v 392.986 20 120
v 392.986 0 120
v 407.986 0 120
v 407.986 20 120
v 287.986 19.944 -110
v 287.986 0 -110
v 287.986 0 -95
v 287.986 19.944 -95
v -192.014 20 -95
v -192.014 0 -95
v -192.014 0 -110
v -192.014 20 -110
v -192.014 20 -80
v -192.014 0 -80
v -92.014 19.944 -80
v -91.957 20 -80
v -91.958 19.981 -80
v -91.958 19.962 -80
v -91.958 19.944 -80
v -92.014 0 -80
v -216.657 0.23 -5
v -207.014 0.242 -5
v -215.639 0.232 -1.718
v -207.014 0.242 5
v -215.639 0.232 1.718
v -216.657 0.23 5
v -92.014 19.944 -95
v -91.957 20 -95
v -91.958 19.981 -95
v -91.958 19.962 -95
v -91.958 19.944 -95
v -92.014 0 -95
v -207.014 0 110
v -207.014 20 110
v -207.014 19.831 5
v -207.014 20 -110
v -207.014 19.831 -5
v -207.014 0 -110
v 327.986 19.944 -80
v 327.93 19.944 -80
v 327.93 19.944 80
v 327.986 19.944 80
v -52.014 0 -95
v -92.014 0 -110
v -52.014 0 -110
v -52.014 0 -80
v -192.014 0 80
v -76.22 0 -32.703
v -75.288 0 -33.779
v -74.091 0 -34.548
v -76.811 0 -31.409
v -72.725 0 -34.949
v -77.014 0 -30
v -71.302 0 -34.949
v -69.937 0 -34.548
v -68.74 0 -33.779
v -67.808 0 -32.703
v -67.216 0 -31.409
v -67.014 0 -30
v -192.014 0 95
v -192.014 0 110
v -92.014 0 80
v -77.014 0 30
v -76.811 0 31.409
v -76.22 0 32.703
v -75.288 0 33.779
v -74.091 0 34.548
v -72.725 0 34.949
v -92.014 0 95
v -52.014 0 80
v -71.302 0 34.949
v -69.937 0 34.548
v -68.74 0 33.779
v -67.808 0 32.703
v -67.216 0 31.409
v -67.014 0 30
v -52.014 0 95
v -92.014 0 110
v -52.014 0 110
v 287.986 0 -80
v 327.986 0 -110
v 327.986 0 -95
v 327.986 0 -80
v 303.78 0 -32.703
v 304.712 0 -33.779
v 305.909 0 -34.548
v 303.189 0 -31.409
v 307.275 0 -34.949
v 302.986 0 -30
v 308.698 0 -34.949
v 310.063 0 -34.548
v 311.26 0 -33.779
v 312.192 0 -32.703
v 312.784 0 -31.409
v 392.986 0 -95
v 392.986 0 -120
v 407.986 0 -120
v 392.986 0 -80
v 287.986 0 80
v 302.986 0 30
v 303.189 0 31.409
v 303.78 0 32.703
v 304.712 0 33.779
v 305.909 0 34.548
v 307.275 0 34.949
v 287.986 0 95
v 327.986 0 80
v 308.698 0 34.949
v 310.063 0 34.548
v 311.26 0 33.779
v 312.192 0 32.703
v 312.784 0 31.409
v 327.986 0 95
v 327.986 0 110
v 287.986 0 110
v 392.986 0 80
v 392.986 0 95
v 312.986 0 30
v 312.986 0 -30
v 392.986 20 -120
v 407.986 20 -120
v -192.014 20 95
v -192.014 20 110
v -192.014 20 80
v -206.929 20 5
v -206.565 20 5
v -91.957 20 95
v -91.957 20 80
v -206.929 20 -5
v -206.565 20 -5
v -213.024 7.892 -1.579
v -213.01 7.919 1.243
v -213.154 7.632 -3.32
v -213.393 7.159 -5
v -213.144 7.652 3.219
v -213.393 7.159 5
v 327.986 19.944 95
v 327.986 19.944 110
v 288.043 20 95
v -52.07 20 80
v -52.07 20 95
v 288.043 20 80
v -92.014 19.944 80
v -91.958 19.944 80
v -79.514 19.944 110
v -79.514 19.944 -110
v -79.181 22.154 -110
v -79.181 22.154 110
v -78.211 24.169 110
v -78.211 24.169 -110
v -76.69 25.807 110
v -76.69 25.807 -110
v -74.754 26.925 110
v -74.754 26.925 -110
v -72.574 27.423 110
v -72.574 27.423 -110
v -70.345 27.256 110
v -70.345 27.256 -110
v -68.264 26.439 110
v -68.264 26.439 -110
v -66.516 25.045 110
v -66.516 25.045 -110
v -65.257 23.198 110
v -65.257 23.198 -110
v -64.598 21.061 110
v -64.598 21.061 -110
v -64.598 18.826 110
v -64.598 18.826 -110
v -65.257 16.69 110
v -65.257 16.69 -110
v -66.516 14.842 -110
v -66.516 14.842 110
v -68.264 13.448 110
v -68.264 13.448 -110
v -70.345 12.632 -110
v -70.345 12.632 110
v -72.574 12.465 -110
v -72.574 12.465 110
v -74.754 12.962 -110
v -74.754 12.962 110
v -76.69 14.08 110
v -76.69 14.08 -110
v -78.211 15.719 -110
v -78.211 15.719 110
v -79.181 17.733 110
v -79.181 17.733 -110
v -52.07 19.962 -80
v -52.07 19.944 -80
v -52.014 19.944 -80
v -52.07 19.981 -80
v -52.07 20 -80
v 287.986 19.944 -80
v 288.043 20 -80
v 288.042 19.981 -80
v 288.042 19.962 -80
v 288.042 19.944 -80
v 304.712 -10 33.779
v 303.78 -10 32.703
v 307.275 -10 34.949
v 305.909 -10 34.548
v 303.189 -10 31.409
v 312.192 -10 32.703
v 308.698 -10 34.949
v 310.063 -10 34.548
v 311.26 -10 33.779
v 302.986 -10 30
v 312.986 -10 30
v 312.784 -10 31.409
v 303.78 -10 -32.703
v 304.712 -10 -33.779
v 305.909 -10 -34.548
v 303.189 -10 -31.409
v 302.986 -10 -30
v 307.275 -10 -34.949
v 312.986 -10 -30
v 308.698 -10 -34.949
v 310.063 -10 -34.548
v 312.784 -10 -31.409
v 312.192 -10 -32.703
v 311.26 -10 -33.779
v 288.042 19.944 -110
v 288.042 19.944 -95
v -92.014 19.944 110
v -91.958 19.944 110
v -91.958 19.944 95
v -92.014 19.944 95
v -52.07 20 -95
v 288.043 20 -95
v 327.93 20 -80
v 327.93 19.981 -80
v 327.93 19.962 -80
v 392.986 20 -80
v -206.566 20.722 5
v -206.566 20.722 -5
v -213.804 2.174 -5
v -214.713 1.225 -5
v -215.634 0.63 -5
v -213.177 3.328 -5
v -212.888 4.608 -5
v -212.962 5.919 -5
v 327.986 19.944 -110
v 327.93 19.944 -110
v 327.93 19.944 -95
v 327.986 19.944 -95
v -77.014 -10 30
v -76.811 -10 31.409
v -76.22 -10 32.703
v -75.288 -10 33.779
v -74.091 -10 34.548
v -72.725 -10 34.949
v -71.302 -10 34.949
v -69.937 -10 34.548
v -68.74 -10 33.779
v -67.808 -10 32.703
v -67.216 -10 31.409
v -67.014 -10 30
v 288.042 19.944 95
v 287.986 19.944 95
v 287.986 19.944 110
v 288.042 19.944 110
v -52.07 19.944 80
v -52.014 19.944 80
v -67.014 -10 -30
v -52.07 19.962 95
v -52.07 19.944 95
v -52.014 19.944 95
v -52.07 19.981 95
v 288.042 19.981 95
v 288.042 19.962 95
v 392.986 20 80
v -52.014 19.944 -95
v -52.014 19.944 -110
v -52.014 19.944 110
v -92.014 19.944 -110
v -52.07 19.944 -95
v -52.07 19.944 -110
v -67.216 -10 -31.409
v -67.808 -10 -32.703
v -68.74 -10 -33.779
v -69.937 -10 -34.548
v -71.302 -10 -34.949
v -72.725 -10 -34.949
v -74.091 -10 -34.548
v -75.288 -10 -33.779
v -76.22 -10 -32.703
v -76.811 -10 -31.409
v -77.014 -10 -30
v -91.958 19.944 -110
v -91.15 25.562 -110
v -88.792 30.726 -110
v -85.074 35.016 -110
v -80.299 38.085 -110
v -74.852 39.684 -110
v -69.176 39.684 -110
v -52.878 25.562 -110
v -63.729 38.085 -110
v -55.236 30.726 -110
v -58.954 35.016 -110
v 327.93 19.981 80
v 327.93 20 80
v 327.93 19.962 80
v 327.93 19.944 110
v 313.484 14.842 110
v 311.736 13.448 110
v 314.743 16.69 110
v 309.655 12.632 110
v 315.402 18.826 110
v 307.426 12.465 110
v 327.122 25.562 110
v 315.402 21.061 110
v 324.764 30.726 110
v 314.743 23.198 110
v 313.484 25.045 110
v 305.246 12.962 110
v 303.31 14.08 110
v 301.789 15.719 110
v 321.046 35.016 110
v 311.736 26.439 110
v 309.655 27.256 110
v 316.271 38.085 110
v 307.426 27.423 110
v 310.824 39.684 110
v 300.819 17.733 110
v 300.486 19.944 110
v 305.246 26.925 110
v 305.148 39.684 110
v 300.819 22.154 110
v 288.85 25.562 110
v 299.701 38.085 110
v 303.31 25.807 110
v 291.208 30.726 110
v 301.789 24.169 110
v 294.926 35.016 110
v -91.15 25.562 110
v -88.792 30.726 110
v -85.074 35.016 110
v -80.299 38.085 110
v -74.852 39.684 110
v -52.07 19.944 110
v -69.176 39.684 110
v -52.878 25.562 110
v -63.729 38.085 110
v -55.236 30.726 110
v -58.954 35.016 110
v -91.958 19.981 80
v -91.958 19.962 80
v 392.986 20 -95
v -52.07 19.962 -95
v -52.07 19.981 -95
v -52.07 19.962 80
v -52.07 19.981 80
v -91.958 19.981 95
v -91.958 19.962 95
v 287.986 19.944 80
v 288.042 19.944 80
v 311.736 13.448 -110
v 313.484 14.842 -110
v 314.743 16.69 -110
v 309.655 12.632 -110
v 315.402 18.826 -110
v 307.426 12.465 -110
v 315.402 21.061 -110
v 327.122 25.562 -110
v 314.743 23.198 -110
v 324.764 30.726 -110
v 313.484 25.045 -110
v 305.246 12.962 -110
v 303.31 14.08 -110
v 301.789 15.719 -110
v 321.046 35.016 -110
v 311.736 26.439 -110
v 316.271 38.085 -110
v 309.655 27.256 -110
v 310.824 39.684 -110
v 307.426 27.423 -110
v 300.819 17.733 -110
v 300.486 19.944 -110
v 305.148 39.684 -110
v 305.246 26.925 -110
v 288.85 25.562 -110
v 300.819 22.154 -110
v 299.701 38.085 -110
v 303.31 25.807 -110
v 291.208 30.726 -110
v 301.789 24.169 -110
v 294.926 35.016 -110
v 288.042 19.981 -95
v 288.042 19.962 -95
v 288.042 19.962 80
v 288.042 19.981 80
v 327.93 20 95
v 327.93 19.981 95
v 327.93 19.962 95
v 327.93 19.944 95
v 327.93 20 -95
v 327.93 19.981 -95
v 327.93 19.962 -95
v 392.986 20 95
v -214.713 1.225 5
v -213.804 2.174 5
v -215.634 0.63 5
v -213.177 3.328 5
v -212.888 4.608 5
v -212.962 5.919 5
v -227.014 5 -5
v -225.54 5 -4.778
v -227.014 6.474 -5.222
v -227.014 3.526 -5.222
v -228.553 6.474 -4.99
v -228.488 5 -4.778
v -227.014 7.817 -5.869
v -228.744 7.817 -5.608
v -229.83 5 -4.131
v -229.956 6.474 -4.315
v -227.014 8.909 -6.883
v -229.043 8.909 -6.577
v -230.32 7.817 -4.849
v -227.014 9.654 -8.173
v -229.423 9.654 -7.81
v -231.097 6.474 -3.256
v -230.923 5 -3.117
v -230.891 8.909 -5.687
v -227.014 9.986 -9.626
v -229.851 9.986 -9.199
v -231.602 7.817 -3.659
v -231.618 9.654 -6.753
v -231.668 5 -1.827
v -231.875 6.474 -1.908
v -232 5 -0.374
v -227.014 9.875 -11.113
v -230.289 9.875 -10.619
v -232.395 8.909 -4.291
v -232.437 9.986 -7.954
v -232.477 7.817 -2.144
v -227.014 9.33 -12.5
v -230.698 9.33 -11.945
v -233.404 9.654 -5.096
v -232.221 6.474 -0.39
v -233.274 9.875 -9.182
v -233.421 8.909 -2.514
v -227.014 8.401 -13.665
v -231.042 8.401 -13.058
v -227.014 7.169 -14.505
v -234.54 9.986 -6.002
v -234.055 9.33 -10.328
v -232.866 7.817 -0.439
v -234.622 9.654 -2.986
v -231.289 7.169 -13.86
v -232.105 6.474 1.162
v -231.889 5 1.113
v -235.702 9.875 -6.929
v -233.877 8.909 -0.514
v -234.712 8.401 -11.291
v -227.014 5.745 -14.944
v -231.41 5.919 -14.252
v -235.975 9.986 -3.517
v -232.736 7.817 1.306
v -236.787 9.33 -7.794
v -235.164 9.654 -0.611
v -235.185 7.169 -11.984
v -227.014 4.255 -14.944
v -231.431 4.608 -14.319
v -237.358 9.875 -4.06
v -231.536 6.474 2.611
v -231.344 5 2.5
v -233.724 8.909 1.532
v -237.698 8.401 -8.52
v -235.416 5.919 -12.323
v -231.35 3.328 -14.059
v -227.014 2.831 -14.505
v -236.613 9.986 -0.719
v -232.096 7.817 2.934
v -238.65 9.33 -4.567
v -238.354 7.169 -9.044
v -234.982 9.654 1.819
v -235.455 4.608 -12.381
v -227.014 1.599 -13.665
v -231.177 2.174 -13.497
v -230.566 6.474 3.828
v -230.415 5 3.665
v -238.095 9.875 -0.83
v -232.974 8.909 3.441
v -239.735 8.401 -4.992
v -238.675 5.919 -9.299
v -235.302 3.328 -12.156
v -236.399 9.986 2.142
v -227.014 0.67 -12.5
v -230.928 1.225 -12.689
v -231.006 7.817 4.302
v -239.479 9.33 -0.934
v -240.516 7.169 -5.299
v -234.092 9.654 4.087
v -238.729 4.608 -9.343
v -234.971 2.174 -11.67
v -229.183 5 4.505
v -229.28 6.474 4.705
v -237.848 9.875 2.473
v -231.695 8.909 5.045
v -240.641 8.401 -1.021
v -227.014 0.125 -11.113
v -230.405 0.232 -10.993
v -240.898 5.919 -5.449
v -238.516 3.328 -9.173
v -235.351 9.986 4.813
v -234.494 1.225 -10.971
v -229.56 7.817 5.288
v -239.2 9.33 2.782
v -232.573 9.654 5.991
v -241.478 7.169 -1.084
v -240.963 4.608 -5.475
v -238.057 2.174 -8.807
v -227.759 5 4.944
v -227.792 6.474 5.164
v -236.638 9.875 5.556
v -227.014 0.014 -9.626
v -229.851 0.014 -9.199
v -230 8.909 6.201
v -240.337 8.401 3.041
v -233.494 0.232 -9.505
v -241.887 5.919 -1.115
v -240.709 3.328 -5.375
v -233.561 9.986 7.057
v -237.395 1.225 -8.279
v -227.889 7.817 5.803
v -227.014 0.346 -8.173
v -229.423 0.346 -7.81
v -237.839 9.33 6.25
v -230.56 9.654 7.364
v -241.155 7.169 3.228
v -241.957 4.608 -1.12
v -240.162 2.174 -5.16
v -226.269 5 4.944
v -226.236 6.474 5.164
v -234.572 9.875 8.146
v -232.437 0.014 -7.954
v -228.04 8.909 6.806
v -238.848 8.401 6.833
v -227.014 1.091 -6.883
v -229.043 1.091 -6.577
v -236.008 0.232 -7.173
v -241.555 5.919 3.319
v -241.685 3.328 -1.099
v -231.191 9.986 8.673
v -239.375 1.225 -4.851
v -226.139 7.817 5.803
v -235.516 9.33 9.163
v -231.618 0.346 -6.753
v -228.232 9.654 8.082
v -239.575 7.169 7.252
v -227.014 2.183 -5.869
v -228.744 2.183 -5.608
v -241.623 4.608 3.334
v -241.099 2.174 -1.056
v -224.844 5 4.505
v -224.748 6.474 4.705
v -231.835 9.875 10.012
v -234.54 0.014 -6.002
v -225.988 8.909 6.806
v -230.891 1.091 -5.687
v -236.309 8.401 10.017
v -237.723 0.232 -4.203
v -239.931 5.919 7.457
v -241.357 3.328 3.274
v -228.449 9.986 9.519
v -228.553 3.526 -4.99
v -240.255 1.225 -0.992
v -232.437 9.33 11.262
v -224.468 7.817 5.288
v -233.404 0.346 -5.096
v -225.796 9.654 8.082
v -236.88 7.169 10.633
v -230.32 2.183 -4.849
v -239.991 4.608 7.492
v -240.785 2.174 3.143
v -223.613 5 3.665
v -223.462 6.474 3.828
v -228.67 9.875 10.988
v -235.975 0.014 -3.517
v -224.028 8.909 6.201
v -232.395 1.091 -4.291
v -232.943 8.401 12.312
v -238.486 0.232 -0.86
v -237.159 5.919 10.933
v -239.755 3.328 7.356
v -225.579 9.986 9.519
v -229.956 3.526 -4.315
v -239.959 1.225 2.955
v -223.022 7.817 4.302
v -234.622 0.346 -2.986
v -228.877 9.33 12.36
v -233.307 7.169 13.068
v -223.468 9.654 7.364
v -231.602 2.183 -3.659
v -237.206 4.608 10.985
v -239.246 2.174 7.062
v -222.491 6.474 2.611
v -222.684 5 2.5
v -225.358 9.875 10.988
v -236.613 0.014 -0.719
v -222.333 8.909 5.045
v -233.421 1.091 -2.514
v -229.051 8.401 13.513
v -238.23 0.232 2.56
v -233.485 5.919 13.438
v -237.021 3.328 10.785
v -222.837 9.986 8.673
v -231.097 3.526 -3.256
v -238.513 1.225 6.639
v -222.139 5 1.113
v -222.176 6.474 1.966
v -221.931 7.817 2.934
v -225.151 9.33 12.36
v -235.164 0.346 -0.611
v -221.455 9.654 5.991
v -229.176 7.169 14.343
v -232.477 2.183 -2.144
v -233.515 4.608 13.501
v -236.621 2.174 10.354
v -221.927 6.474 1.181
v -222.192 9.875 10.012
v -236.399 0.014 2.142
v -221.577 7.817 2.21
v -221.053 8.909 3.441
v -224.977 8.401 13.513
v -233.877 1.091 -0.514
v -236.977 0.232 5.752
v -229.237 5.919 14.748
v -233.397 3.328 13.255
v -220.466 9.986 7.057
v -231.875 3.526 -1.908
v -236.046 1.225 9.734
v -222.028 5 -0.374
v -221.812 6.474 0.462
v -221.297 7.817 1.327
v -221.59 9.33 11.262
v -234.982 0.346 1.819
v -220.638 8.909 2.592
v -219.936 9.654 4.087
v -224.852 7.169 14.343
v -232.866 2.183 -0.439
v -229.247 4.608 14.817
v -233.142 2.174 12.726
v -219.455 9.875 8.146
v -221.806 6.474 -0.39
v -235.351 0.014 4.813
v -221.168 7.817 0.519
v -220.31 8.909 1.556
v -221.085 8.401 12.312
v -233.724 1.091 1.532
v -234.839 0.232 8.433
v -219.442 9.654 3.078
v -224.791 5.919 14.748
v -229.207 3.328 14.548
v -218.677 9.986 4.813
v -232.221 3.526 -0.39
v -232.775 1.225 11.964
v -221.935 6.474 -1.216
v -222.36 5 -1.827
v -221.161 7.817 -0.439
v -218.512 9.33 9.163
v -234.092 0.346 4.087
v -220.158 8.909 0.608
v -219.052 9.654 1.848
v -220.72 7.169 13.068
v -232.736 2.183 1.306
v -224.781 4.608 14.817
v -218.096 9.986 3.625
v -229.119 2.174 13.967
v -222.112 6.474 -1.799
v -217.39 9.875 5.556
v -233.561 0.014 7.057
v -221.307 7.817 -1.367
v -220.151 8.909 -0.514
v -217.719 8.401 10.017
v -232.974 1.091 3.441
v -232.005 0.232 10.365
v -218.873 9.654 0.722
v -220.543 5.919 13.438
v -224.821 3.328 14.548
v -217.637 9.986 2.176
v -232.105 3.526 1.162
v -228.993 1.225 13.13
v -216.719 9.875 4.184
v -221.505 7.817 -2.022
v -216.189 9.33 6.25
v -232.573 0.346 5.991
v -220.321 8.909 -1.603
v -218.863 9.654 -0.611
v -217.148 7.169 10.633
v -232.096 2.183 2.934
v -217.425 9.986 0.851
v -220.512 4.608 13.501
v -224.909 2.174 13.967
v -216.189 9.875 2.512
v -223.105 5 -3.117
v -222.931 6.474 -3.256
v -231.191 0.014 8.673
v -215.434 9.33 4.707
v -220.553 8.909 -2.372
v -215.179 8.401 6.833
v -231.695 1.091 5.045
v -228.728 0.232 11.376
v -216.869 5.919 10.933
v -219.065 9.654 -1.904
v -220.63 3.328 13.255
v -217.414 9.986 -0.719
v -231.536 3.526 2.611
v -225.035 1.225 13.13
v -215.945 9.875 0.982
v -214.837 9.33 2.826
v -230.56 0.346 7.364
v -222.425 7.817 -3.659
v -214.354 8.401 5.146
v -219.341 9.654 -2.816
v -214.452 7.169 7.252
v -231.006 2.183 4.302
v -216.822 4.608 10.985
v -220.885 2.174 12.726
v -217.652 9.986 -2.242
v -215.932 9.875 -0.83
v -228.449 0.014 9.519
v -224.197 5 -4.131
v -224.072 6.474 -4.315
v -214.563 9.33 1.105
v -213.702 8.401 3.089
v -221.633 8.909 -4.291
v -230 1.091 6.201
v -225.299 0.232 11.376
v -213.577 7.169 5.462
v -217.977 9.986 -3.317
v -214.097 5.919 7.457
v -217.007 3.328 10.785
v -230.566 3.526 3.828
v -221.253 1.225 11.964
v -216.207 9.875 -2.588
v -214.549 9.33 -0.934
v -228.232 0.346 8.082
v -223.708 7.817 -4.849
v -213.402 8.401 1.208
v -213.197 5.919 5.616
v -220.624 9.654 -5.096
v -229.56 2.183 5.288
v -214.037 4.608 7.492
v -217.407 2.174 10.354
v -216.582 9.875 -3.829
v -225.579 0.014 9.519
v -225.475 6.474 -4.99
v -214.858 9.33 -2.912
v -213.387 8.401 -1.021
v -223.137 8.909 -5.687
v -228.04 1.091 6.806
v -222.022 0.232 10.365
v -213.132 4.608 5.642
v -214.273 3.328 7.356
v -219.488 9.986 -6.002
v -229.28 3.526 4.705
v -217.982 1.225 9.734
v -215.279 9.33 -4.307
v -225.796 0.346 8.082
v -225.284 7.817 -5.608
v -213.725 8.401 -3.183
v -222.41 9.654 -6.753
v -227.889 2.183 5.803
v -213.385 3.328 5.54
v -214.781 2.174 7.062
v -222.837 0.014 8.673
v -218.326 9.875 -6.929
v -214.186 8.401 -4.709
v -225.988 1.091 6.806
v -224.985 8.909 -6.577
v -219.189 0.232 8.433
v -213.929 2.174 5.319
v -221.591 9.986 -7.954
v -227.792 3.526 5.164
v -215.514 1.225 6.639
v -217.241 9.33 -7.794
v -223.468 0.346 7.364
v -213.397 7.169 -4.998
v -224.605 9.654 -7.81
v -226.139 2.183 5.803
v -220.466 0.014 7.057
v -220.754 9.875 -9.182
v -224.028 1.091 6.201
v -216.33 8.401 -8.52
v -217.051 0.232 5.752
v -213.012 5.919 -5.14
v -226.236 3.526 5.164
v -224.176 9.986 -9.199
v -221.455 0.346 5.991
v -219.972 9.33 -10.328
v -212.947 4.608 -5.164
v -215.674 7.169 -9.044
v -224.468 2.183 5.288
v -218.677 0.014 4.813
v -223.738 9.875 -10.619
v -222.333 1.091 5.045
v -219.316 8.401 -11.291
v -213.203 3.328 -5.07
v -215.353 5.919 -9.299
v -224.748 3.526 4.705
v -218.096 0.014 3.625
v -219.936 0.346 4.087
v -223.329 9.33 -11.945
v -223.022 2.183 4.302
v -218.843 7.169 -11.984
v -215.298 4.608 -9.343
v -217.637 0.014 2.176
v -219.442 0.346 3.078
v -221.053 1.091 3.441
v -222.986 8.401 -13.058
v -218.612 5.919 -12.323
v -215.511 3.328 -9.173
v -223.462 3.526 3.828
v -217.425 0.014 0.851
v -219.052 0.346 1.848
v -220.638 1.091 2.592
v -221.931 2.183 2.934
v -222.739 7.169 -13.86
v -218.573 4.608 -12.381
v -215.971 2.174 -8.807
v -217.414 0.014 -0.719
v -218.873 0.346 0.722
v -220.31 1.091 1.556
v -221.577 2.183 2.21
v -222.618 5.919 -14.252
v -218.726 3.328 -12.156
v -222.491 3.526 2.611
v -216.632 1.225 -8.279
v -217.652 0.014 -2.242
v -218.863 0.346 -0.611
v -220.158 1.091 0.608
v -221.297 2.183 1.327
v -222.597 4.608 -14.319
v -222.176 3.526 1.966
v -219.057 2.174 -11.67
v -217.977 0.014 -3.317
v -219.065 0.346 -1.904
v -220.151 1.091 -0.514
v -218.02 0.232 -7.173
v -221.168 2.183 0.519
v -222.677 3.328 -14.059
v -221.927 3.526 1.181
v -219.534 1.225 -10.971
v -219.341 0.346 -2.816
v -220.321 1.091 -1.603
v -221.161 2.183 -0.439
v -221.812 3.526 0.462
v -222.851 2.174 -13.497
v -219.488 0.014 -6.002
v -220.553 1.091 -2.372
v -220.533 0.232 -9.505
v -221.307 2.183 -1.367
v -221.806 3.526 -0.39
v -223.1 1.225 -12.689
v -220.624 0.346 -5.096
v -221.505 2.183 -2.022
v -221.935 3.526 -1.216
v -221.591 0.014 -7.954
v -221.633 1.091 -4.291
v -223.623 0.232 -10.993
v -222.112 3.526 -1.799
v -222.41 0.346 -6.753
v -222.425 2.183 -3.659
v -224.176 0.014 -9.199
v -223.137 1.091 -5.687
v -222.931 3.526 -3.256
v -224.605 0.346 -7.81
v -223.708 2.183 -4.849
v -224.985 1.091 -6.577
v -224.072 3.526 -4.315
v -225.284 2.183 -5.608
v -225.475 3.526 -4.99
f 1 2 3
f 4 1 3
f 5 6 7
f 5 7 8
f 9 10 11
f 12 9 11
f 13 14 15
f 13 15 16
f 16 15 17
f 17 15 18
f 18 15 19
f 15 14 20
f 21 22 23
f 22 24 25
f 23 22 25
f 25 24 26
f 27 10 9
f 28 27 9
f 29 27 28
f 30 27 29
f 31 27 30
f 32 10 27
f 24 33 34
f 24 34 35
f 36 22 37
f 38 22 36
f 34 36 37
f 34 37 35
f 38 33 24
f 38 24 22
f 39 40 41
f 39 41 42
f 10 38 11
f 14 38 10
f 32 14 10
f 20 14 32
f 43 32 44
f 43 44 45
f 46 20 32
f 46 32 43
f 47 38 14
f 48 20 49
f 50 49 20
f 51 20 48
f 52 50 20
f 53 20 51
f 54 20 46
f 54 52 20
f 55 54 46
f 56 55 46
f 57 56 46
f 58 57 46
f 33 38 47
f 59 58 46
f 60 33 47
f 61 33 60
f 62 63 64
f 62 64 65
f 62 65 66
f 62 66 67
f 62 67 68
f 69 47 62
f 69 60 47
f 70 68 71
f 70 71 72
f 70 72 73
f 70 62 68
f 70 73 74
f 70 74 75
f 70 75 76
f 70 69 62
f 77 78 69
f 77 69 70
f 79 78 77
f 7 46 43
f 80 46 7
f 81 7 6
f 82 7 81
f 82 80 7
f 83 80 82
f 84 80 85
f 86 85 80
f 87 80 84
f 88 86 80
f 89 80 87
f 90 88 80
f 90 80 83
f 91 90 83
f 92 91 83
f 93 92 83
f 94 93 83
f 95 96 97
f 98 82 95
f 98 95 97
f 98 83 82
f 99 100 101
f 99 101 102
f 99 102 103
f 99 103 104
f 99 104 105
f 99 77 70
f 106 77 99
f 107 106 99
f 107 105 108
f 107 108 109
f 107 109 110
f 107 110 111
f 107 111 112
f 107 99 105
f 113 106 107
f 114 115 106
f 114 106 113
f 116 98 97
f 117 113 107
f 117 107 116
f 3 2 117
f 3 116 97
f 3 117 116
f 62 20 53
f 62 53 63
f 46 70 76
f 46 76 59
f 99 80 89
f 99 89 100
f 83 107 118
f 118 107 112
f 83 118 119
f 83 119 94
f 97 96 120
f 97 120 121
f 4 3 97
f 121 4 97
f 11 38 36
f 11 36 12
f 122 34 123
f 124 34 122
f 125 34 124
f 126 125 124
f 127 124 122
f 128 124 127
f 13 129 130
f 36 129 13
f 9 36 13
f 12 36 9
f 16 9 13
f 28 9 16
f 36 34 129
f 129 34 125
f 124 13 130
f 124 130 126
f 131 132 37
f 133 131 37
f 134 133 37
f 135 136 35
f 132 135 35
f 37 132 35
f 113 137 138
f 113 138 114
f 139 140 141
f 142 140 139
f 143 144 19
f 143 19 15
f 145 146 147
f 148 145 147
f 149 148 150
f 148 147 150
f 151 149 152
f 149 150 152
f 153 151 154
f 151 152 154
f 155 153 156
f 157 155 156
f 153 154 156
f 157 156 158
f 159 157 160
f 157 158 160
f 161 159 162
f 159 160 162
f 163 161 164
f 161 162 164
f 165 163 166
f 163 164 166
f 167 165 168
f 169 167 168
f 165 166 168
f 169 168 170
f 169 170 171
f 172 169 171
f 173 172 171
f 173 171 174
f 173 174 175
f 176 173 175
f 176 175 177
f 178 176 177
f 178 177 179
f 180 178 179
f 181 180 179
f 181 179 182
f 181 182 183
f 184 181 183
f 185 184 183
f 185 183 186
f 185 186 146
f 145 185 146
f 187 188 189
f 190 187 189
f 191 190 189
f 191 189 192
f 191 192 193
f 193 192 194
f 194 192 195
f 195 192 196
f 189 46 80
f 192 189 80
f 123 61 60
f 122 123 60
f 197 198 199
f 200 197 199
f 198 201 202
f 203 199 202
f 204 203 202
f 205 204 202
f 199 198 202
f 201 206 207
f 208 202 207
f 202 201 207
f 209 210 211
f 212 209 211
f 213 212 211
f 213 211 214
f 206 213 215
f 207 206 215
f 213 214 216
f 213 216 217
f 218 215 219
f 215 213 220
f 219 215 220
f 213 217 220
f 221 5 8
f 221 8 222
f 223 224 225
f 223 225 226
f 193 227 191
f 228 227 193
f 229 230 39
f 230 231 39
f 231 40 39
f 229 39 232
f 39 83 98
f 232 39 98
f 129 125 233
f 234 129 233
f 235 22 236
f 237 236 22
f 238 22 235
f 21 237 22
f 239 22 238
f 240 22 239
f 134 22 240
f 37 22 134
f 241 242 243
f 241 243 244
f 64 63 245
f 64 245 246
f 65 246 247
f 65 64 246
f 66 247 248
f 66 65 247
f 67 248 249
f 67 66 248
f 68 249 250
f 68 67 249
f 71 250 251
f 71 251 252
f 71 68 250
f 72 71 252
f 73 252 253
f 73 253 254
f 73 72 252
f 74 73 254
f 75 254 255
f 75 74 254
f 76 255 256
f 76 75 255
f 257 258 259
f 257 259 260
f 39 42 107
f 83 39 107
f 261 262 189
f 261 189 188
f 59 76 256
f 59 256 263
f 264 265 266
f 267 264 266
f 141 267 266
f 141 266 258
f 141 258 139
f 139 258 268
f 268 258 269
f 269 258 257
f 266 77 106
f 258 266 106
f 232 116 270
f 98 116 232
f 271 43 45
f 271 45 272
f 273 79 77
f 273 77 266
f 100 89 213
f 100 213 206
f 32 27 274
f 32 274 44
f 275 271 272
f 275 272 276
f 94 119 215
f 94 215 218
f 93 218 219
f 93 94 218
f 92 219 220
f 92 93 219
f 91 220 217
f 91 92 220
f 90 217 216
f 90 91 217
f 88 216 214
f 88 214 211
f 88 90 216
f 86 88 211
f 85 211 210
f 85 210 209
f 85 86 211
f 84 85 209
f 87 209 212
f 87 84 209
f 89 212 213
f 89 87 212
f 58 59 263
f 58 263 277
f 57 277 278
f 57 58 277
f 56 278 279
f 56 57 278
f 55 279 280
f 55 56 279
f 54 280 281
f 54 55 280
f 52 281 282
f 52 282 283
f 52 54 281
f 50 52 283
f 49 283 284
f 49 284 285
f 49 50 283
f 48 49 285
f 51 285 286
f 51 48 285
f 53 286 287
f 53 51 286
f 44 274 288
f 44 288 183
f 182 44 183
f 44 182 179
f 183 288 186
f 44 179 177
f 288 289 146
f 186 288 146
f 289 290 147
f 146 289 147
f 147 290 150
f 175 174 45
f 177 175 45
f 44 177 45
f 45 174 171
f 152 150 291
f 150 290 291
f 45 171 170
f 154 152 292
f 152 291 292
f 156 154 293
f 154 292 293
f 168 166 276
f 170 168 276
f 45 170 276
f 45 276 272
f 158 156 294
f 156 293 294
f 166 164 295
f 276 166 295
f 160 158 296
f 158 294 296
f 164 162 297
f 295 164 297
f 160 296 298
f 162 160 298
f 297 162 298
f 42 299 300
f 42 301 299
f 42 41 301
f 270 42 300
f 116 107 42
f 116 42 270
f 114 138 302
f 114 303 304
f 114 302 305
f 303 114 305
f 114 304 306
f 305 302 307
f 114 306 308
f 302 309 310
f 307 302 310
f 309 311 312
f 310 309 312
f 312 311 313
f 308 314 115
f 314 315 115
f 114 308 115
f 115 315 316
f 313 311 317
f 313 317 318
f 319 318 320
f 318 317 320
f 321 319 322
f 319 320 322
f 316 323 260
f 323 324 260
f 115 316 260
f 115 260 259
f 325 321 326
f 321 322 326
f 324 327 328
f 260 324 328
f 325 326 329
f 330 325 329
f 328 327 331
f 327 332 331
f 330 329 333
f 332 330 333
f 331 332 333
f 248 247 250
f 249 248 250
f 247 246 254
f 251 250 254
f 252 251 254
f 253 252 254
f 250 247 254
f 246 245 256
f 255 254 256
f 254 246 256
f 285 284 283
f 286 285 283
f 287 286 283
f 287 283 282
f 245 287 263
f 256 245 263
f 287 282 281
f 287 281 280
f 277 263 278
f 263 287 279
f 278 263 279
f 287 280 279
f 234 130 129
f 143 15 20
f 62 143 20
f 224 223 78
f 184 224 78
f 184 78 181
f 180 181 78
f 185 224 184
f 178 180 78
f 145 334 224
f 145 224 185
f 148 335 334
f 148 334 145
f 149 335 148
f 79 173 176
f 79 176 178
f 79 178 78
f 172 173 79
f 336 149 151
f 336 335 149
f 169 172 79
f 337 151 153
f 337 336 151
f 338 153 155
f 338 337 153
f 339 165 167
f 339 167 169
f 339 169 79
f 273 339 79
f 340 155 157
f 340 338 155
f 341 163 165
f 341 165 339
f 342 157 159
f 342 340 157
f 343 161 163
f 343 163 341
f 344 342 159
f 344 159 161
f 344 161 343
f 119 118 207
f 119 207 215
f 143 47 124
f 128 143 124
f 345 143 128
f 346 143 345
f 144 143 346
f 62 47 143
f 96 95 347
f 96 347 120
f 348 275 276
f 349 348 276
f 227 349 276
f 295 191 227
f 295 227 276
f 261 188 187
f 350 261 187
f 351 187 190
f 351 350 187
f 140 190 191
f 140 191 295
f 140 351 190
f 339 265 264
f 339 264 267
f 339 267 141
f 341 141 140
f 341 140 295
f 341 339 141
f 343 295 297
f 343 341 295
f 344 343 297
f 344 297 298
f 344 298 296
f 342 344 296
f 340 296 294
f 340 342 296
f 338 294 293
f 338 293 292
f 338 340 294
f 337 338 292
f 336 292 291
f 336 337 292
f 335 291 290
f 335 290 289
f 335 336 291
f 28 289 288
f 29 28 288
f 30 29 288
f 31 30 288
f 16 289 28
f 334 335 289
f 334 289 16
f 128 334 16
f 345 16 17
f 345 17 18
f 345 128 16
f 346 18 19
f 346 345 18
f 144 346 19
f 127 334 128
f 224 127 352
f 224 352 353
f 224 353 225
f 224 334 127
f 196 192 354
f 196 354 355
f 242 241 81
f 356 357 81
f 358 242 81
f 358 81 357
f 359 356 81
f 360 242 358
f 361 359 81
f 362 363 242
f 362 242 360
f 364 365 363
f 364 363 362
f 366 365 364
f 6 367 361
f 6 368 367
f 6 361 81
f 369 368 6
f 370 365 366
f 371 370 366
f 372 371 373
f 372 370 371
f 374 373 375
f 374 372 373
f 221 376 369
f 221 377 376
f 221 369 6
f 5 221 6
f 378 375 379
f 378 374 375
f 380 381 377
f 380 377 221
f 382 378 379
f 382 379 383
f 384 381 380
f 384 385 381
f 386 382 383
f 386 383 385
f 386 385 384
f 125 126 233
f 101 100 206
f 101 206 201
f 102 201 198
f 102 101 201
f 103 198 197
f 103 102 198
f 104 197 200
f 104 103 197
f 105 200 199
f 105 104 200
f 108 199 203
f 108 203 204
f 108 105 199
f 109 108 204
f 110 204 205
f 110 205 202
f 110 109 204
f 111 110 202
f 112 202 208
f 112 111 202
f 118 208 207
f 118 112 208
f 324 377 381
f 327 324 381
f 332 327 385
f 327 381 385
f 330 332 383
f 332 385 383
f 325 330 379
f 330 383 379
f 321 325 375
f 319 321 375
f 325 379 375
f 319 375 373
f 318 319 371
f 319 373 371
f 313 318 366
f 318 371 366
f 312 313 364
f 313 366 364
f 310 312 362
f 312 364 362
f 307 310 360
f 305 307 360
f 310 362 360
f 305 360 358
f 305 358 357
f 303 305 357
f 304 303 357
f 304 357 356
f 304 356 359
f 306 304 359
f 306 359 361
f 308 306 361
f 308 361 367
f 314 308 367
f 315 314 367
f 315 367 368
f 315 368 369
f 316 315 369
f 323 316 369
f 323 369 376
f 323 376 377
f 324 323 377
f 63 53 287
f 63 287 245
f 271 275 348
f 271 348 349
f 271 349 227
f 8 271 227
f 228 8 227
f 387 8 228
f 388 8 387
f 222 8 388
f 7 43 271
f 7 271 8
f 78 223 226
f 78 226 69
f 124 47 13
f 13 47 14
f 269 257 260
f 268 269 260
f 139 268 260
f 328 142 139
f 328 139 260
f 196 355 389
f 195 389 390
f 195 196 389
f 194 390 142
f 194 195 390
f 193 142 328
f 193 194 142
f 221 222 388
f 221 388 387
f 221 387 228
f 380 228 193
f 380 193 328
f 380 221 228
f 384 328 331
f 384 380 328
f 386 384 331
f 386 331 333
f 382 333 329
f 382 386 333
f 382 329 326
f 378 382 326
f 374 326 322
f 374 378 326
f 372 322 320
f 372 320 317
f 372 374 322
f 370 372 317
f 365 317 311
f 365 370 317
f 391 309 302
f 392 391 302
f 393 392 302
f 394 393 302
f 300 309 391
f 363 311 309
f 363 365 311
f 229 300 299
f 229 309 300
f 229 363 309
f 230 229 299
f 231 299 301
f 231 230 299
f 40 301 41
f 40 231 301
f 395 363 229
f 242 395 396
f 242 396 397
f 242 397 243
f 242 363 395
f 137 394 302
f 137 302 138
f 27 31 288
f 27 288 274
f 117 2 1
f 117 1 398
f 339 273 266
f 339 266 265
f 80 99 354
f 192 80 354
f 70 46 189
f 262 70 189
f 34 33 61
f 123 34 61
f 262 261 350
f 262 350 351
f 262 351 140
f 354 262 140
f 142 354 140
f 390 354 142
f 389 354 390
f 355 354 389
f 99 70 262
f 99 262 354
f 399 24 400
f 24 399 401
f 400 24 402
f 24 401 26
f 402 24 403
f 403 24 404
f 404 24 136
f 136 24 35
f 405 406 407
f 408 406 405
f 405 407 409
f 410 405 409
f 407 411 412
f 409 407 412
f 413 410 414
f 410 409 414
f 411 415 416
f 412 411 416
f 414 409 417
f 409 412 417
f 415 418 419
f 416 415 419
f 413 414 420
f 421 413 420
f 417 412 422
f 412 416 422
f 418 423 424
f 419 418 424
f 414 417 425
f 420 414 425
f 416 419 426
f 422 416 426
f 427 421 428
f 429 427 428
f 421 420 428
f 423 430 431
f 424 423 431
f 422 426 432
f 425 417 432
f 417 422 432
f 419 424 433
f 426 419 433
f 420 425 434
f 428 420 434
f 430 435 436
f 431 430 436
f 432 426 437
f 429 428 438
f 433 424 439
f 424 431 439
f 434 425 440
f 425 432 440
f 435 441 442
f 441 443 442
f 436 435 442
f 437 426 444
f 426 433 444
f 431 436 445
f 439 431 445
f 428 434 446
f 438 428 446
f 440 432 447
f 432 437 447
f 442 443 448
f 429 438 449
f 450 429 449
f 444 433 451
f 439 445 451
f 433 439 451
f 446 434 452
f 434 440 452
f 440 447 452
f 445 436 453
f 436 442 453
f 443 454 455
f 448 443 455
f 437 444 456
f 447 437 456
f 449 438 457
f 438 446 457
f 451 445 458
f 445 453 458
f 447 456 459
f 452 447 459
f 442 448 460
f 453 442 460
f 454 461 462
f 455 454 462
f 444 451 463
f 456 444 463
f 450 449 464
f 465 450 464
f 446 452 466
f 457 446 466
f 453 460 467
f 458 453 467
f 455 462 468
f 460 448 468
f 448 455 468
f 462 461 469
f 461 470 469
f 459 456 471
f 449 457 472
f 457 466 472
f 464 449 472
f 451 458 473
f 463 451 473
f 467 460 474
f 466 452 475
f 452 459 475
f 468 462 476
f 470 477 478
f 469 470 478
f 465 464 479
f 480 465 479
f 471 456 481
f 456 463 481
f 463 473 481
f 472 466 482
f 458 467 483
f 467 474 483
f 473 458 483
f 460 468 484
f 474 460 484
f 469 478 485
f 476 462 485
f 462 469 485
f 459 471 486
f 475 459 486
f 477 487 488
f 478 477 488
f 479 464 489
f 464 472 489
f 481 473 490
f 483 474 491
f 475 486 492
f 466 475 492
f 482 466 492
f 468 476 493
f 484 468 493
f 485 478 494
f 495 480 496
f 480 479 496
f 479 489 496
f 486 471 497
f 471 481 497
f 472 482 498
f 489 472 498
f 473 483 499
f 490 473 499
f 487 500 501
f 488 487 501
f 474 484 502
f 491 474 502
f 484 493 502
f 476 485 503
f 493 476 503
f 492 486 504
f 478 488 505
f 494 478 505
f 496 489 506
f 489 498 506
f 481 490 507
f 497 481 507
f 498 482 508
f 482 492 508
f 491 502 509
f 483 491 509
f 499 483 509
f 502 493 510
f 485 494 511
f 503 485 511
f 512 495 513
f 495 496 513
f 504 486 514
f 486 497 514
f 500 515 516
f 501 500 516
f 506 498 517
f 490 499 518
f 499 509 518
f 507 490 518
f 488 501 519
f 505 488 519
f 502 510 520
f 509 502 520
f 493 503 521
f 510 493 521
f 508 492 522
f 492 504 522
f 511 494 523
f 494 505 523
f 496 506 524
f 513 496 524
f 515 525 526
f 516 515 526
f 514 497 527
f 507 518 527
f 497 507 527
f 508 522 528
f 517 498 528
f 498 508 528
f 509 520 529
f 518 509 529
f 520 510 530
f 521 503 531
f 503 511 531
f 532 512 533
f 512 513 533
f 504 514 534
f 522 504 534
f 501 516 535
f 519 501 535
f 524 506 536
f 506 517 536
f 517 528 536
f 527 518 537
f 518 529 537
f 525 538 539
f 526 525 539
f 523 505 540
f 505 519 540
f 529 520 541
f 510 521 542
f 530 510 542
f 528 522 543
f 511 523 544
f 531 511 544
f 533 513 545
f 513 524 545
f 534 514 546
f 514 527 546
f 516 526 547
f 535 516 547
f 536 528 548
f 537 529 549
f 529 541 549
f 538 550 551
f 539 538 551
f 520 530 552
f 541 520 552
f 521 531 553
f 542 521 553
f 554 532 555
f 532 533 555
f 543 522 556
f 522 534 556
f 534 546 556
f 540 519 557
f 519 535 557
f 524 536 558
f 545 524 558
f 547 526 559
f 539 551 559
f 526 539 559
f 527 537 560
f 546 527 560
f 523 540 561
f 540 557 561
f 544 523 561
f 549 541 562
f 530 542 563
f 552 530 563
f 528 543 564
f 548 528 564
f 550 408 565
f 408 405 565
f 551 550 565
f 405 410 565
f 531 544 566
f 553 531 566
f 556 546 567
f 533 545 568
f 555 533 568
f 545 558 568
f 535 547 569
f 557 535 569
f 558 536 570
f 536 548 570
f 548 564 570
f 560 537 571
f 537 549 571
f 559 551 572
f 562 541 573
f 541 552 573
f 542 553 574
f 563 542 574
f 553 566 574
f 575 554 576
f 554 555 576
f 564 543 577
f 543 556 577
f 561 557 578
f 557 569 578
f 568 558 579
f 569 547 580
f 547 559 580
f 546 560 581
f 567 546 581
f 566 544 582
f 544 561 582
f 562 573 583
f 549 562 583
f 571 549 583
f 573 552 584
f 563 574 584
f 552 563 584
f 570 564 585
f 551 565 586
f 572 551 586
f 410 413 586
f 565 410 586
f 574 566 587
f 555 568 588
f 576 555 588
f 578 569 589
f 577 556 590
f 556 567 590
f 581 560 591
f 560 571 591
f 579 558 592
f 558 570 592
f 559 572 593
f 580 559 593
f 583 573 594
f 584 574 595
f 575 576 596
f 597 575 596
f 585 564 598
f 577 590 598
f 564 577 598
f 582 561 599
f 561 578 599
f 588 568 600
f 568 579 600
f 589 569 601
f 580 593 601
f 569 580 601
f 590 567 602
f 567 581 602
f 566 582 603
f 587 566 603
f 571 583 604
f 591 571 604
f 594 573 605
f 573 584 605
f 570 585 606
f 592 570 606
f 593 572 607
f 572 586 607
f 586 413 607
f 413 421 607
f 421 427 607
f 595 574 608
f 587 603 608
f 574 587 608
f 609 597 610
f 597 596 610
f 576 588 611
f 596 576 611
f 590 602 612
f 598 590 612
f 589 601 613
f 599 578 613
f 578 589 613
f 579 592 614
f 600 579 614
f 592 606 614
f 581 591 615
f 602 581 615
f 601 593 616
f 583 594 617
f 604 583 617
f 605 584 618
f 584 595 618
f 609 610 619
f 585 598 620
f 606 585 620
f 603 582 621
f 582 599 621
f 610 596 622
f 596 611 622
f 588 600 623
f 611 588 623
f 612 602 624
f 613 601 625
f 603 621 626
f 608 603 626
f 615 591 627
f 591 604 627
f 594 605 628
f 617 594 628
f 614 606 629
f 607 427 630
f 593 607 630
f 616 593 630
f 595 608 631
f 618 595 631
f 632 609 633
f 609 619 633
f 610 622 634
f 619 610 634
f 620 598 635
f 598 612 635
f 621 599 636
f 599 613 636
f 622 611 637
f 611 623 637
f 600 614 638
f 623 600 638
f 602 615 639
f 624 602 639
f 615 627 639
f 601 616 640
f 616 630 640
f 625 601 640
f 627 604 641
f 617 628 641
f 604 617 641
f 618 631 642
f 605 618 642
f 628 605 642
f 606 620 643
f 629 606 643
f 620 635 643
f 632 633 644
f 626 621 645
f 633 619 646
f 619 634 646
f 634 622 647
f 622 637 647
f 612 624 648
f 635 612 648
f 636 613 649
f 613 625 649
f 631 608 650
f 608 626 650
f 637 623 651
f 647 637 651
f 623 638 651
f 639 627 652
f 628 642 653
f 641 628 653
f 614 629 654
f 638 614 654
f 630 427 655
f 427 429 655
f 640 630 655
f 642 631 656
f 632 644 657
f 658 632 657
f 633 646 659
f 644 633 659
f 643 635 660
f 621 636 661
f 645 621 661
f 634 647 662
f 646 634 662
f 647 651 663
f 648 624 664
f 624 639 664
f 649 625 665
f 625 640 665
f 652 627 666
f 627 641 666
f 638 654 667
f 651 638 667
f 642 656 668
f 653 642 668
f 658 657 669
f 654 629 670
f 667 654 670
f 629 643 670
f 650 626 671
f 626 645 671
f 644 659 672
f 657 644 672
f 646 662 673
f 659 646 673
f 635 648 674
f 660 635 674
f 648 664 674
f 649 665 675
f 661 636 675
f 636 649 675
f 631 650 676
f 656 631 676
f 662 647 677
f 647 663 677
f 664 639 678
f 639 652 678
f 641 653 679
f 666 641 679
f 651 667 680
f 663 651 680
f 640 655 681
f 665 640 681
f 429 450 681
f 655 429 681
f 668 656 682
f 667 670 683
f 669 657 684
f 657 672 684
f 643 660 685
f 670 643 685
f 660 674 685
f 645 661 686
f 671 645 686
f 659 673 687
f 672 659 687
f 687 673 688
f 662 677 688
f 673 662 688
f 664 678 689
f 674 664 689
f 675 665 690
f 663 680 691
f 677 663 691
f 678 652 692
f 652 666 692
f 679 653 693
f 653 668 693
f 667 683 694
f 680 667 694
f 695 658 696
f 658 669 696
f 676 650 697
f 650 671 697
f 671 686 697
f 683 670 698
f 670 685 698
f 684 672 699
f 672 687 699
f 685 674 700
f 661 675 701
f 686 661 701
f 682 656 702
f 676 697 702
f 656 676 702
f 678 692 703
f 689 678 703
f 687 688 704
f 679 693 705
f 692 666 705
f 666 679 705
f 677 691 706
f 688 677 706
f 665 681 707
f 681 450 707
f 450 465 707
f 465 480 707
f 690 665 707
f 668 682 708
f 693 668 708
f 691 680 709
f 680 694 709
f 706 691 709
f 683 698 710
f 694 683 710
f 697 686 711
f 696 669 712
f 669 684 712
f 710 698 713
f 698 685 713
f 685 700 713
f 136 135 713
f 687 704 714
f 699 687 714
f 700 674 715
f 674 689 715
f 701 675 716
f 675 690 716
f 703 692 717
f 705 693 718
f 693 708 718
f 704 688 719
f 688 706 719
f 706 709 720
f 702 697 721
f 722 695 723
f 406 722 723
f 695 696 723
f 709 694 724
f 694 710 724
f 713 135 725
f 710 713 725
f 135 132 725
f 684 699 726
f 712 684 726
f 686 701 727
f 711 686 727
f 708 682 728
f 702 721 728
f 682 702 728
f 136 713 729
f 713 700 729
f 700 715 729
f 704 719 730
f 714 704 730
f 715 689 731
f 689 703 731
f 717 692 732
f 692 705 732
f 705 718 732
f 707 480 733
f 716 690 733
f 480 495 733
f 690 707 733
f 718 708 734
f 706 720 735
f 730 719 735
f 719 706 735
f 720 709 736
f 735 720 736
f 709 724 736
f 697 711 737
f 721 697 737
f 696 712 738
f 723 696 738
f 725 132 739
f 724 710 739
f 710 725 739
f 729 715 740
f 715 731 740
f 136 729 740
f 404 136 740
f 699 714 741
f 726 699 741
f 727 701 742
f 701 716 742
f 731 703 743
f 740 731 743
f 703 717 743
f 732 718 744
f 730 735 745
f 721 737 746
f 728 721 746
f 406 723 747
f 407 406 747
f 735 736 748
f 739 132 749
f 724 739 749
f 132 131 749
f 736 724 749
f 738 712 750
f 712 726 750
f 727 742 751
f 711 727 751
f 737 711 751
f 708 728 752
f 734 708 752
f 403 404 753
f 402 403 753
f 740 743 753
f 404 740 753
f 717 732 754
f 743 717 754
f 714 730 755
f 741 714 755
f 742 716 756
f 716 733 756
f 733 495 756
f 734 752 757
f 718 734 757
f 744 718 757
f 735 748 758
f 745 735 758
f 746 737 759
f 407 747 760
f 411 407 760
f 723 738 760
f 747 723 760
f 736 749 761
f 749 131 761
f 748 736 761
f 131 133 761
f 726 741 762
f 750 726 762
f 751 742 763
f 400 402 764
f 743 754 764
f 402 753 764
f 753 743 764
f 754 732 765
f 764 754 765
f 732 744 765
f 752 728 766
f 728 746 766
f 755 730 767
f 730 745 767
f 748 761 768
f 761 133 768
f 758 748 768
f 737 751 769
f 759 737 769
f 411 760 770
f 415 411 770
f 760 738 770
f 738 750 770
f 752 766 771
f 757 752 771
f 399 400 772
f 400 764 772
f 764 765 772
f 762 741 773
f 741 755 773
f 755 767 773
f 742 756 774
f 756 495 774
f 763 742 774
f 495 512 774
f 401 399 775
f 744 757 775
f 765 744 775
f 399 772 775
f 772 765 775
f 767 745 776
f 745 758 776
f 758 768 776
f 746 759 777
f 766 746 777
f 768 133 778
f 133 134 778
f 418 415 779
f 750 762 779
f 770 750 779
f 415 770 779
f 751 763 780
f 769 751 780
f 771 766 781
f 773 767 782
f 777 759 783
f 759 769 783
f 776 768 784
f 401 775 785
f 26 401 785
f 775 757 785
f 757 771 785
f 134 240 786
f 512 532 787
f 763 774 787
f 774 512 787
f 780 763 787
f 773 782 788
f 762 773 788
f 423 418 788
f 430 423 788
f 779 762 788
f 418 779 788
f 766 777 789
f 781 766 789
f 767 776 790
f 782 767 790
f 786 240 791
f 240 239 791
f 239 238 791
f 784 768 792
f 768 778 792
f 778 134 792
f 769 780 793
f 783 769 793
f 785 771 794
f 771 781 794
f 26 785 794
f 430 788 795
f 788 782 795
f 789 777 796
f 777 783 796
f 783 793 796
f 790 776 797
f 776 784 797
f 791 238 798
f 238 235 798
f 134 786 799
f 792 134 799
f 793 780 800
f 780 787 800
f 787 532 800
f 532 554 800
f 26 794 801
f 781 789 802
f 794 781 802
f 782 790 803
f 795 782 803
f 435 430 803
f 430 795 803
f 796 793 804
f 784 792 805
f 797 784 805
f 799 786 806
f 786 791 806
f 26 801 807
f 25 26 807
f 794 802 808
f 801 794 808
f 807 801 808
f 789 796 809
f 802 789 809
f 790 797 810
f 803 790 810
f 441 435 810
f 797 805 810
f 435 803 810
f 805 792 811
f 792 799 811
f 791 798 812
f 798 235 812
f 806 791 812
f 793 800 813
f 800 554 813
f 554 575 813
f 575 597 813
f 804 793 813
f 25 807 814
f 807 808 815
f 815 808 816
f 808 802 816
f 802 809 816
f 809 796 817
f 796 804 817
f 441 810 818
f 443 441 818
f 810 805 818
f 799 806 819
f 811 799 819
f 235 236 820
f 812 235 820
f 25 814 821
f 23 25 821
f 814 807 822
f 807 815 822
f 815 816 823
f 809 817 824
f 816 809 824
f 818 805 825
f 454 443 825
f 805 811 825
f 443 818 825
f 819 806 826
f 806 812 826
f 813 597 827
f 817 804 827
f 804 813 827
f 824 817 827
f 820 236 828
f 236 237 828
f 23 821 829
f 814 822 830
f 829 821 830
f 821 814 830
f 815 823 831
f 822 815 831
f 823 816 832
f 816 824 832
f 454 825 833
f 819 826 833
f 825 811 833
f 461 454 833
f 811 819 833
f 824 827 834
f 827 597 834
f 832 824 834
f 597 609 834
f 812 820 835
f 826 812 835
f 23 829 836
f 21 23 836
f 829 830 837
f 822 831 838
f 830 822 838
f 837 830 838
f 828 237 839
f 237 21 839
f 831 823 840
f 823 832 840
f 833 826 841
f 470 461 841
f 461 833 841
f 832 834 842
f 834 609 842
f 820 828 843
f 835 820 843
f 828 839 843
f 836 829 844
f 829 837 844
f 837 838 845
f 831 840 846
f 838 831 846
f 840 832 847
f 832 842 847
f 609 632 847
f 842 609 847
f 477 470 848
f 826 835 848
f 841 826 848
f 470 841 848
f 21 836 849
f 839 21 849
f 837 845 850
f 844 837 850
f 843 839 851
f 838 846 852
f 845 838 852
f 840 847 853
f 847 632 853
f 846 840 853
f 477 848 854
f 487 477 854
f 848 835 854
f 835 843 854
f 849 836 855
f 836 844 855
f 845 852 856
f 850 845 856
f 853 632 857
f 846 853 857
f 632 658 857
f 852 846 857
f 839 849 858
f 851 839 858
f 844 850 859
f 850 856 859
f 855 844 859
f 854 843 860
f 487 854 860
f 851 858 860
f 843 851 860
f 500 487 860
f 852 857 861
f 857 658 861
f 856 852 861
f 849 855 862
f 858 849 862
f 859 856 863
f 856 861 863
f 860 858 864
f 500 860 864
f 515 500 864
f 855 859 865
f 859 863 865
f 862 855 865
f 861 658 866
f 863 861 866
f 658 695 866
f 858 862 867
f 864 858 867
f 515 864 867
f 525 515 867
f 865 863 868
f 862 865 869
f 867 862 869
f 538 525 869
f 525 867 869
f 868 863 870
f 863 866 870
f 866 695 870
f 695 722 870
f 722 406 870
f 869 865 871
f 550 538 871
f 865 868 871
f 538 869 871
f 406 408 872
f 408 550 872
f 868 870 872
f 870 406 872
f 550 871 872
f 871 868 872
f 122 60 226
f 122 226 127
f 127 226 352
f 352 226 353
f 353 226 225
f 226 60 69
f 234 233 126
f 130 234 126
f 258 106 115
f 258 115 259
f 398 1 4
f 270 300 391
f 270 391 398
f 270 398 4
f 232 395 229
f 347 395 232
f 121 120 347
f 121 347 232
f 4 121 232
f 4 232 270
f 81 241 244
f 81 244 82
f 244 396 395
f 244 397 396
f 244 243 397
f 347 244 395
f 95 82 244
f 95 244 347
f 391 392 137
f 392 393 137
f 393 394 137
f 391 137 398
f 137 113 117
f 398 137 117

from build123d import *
from build123d.topology import SkipClean

# Parameters (mm, degrees)
SKETCH1_W           = 15
SKETCH1_H           = 220
SKETCH1_H_2         = 240
SKETCH1_W_2         = 585
SKETCH1_H_3         = 15
BOSS_EXTRUDE1_DEPTH = 20
BOSS_EXTRUDE2_DEPTH = 110
SKETCH3_R           = 7.5
CUT_EXTRUDE1_DEPTH  = 471.046447738
SKETCH9_R           = 5
BOSS_EXTRUDE3_DEPTH = 5
BOSS_EXTRUDE4_DEPTH = 10


with BuildPart() as part:
    # Sketch1 → Boss-Extrude1 (new body)
    with BuildSketch(Plane(origin=(0, 0, 0), x_dir=(1, 0, 0), z_dir=(0, 1, 0))):
        with Locations((-199.513888889, 0)):
            Rectangle(SKETCH1_W, SKETCH1_H)
        with Locations((400.486111111, 0)):
            Rectangle(SKETCH1_W, SKETCH1_H_2)
        with Locations((100.486111111, -87.5)):
            Rectangle(SKETCH1_W_2, SKETCH1_H_3)
        with Locations((100.486111111, 87.5)):
            Rectangle(SKETCH1_W_2, SKETCH1_H_3)
    extrude(amount=BOSS_EXTRUDE1_DEPTH)

    # Sketch2 → Boss-Extrude2 (add, symmetric)
    with BuildSketch(Plane.XY):
        with BuildLine():
            Line((327.929757791, 19.943646679), (327.986111111, 19.943646679))
            Line((327.986111111, 19.943646679), (327.986111111, 0))
            Line((327.986111111, 0), (287.986111111, 0))
            Line((287.986111111, 0), (287.986111111, 19.943646679))
            Line((287.986111111, 19.943646679), (288.042464432, 19.943646679))
            ThreePointArc((288.042464432, 19.943646679), (307.986111111, 39.887293359), (327.929757791, 19.943646679))
        make_face()
        with BuildLine():
            Line((-92.013888889, 0), (-52.013888889, 0))
            Line((-52.013888889, 0), (-52.013888889, 19.943646679))
            Line((-52.013888889, 19.943646679), (-52.070242209, 19.943646679))
            ThreePointArc((-52.070242209, 19.943646679), (-72.013888889, 39.887293359), (-91.957535568, 19.943646679))
            Line((-91.957535568, 19.943646679), (-92.013888889, 19.943646679))
            Line((-92.013888889, 19.943646679), (-92.013888889, 0))
        make_face()
    extrude(amount=BOSS_EXTRUDE2_DEPTH, both=True)

    # Sketch3 → Cut-Extrude1 (cut, through all)
    with BuildSketch(Plane(origin=(0, 0, -110), x_dir=(-1, 0, 0), z_dir=(0, 0, -1))):
        with Locations((72.013888889, 19.943646679)):
            Circle(SKETCH3_R)
        with Locations((-307.986111111, 19.943646679)):
            Circle(SKETCH3_R)
    extrude(amount=-CUT_EXTRUDE1_DEPTH, mode=Mode.SUBTRACT)



with BuildPart() as body_2:
    # Sketch9 → Revolve1 (revolve)
    with BuildSketch(Plane.XY, mode=Mode.PRIVATE) as revolve1_sk:
        with Locations((-237.013888889, 5)):
            Circle(SKETCH9_R)
    revolve(revolve1_sk.sketch.rotate(Axis((-227.013888889, 0, 0), (0, 1, 0)), 270), axis=Axis((-227.013888889, 0, 0), (0, 1, 0)))


with BuildPart() as part_1:
    with SkipClean():  # the faces are left unmerged after this step: merging them gives an invalid solid
        add(part.part)

        add(body_2.part)  # Boss-Extrude3 merges body 2
        # Sketch12 → Boss-Extrude3 (add, symmetric)
        with BuildSketch(Plane.XY):
            Polygon((-206.542026968, 0.242112027), (-216.880044211, 0.230191772), (-206.565640886, 20.721631917), align=None)
        extrude(amount=BOSS_EXTRUDE3_DEPTH, both=True)

    # Sketch7 → Boss-Extrude4 (add)
    with SkipClean():  # the faces are left unmerged after this step: merging them gives an invalid solid
        with BuildSketch(Plane(origin=(0, 0, 0), x_dir=(-1, 0, 0), z_dir=(0, -1, 0))):
            with BuildLine():
                Line((77.013888889, 30), (77.013888889, -30))
                ThreePointArc((77.013888889, -30), (72.013888889, -35), (67.013888889, -30))
                Line((67.013888889, -30), (67.013888889, 30))
                ThreePointArc((67.013888889, 30), (72.013888889, 35), (77.013888889, 30))
            make_face()
            with BuildLine():
                Line((-302.986111111, 30), (-302.986111111, -30))
                ThreePointArc((-302.986111111, -30), (-307.986111111, -35), (-312.986111111, -30))
                Line((-312.986111111, -30), (-312.986111111, 30))
                ThreePointArc((-312.986111111, 30), (-307.986111111, 35), (-302.986111111, 30))
            make_face()
        extrude(amount=BOSS_EXTRUDE4_DEPTH)


solid = part_1.part
